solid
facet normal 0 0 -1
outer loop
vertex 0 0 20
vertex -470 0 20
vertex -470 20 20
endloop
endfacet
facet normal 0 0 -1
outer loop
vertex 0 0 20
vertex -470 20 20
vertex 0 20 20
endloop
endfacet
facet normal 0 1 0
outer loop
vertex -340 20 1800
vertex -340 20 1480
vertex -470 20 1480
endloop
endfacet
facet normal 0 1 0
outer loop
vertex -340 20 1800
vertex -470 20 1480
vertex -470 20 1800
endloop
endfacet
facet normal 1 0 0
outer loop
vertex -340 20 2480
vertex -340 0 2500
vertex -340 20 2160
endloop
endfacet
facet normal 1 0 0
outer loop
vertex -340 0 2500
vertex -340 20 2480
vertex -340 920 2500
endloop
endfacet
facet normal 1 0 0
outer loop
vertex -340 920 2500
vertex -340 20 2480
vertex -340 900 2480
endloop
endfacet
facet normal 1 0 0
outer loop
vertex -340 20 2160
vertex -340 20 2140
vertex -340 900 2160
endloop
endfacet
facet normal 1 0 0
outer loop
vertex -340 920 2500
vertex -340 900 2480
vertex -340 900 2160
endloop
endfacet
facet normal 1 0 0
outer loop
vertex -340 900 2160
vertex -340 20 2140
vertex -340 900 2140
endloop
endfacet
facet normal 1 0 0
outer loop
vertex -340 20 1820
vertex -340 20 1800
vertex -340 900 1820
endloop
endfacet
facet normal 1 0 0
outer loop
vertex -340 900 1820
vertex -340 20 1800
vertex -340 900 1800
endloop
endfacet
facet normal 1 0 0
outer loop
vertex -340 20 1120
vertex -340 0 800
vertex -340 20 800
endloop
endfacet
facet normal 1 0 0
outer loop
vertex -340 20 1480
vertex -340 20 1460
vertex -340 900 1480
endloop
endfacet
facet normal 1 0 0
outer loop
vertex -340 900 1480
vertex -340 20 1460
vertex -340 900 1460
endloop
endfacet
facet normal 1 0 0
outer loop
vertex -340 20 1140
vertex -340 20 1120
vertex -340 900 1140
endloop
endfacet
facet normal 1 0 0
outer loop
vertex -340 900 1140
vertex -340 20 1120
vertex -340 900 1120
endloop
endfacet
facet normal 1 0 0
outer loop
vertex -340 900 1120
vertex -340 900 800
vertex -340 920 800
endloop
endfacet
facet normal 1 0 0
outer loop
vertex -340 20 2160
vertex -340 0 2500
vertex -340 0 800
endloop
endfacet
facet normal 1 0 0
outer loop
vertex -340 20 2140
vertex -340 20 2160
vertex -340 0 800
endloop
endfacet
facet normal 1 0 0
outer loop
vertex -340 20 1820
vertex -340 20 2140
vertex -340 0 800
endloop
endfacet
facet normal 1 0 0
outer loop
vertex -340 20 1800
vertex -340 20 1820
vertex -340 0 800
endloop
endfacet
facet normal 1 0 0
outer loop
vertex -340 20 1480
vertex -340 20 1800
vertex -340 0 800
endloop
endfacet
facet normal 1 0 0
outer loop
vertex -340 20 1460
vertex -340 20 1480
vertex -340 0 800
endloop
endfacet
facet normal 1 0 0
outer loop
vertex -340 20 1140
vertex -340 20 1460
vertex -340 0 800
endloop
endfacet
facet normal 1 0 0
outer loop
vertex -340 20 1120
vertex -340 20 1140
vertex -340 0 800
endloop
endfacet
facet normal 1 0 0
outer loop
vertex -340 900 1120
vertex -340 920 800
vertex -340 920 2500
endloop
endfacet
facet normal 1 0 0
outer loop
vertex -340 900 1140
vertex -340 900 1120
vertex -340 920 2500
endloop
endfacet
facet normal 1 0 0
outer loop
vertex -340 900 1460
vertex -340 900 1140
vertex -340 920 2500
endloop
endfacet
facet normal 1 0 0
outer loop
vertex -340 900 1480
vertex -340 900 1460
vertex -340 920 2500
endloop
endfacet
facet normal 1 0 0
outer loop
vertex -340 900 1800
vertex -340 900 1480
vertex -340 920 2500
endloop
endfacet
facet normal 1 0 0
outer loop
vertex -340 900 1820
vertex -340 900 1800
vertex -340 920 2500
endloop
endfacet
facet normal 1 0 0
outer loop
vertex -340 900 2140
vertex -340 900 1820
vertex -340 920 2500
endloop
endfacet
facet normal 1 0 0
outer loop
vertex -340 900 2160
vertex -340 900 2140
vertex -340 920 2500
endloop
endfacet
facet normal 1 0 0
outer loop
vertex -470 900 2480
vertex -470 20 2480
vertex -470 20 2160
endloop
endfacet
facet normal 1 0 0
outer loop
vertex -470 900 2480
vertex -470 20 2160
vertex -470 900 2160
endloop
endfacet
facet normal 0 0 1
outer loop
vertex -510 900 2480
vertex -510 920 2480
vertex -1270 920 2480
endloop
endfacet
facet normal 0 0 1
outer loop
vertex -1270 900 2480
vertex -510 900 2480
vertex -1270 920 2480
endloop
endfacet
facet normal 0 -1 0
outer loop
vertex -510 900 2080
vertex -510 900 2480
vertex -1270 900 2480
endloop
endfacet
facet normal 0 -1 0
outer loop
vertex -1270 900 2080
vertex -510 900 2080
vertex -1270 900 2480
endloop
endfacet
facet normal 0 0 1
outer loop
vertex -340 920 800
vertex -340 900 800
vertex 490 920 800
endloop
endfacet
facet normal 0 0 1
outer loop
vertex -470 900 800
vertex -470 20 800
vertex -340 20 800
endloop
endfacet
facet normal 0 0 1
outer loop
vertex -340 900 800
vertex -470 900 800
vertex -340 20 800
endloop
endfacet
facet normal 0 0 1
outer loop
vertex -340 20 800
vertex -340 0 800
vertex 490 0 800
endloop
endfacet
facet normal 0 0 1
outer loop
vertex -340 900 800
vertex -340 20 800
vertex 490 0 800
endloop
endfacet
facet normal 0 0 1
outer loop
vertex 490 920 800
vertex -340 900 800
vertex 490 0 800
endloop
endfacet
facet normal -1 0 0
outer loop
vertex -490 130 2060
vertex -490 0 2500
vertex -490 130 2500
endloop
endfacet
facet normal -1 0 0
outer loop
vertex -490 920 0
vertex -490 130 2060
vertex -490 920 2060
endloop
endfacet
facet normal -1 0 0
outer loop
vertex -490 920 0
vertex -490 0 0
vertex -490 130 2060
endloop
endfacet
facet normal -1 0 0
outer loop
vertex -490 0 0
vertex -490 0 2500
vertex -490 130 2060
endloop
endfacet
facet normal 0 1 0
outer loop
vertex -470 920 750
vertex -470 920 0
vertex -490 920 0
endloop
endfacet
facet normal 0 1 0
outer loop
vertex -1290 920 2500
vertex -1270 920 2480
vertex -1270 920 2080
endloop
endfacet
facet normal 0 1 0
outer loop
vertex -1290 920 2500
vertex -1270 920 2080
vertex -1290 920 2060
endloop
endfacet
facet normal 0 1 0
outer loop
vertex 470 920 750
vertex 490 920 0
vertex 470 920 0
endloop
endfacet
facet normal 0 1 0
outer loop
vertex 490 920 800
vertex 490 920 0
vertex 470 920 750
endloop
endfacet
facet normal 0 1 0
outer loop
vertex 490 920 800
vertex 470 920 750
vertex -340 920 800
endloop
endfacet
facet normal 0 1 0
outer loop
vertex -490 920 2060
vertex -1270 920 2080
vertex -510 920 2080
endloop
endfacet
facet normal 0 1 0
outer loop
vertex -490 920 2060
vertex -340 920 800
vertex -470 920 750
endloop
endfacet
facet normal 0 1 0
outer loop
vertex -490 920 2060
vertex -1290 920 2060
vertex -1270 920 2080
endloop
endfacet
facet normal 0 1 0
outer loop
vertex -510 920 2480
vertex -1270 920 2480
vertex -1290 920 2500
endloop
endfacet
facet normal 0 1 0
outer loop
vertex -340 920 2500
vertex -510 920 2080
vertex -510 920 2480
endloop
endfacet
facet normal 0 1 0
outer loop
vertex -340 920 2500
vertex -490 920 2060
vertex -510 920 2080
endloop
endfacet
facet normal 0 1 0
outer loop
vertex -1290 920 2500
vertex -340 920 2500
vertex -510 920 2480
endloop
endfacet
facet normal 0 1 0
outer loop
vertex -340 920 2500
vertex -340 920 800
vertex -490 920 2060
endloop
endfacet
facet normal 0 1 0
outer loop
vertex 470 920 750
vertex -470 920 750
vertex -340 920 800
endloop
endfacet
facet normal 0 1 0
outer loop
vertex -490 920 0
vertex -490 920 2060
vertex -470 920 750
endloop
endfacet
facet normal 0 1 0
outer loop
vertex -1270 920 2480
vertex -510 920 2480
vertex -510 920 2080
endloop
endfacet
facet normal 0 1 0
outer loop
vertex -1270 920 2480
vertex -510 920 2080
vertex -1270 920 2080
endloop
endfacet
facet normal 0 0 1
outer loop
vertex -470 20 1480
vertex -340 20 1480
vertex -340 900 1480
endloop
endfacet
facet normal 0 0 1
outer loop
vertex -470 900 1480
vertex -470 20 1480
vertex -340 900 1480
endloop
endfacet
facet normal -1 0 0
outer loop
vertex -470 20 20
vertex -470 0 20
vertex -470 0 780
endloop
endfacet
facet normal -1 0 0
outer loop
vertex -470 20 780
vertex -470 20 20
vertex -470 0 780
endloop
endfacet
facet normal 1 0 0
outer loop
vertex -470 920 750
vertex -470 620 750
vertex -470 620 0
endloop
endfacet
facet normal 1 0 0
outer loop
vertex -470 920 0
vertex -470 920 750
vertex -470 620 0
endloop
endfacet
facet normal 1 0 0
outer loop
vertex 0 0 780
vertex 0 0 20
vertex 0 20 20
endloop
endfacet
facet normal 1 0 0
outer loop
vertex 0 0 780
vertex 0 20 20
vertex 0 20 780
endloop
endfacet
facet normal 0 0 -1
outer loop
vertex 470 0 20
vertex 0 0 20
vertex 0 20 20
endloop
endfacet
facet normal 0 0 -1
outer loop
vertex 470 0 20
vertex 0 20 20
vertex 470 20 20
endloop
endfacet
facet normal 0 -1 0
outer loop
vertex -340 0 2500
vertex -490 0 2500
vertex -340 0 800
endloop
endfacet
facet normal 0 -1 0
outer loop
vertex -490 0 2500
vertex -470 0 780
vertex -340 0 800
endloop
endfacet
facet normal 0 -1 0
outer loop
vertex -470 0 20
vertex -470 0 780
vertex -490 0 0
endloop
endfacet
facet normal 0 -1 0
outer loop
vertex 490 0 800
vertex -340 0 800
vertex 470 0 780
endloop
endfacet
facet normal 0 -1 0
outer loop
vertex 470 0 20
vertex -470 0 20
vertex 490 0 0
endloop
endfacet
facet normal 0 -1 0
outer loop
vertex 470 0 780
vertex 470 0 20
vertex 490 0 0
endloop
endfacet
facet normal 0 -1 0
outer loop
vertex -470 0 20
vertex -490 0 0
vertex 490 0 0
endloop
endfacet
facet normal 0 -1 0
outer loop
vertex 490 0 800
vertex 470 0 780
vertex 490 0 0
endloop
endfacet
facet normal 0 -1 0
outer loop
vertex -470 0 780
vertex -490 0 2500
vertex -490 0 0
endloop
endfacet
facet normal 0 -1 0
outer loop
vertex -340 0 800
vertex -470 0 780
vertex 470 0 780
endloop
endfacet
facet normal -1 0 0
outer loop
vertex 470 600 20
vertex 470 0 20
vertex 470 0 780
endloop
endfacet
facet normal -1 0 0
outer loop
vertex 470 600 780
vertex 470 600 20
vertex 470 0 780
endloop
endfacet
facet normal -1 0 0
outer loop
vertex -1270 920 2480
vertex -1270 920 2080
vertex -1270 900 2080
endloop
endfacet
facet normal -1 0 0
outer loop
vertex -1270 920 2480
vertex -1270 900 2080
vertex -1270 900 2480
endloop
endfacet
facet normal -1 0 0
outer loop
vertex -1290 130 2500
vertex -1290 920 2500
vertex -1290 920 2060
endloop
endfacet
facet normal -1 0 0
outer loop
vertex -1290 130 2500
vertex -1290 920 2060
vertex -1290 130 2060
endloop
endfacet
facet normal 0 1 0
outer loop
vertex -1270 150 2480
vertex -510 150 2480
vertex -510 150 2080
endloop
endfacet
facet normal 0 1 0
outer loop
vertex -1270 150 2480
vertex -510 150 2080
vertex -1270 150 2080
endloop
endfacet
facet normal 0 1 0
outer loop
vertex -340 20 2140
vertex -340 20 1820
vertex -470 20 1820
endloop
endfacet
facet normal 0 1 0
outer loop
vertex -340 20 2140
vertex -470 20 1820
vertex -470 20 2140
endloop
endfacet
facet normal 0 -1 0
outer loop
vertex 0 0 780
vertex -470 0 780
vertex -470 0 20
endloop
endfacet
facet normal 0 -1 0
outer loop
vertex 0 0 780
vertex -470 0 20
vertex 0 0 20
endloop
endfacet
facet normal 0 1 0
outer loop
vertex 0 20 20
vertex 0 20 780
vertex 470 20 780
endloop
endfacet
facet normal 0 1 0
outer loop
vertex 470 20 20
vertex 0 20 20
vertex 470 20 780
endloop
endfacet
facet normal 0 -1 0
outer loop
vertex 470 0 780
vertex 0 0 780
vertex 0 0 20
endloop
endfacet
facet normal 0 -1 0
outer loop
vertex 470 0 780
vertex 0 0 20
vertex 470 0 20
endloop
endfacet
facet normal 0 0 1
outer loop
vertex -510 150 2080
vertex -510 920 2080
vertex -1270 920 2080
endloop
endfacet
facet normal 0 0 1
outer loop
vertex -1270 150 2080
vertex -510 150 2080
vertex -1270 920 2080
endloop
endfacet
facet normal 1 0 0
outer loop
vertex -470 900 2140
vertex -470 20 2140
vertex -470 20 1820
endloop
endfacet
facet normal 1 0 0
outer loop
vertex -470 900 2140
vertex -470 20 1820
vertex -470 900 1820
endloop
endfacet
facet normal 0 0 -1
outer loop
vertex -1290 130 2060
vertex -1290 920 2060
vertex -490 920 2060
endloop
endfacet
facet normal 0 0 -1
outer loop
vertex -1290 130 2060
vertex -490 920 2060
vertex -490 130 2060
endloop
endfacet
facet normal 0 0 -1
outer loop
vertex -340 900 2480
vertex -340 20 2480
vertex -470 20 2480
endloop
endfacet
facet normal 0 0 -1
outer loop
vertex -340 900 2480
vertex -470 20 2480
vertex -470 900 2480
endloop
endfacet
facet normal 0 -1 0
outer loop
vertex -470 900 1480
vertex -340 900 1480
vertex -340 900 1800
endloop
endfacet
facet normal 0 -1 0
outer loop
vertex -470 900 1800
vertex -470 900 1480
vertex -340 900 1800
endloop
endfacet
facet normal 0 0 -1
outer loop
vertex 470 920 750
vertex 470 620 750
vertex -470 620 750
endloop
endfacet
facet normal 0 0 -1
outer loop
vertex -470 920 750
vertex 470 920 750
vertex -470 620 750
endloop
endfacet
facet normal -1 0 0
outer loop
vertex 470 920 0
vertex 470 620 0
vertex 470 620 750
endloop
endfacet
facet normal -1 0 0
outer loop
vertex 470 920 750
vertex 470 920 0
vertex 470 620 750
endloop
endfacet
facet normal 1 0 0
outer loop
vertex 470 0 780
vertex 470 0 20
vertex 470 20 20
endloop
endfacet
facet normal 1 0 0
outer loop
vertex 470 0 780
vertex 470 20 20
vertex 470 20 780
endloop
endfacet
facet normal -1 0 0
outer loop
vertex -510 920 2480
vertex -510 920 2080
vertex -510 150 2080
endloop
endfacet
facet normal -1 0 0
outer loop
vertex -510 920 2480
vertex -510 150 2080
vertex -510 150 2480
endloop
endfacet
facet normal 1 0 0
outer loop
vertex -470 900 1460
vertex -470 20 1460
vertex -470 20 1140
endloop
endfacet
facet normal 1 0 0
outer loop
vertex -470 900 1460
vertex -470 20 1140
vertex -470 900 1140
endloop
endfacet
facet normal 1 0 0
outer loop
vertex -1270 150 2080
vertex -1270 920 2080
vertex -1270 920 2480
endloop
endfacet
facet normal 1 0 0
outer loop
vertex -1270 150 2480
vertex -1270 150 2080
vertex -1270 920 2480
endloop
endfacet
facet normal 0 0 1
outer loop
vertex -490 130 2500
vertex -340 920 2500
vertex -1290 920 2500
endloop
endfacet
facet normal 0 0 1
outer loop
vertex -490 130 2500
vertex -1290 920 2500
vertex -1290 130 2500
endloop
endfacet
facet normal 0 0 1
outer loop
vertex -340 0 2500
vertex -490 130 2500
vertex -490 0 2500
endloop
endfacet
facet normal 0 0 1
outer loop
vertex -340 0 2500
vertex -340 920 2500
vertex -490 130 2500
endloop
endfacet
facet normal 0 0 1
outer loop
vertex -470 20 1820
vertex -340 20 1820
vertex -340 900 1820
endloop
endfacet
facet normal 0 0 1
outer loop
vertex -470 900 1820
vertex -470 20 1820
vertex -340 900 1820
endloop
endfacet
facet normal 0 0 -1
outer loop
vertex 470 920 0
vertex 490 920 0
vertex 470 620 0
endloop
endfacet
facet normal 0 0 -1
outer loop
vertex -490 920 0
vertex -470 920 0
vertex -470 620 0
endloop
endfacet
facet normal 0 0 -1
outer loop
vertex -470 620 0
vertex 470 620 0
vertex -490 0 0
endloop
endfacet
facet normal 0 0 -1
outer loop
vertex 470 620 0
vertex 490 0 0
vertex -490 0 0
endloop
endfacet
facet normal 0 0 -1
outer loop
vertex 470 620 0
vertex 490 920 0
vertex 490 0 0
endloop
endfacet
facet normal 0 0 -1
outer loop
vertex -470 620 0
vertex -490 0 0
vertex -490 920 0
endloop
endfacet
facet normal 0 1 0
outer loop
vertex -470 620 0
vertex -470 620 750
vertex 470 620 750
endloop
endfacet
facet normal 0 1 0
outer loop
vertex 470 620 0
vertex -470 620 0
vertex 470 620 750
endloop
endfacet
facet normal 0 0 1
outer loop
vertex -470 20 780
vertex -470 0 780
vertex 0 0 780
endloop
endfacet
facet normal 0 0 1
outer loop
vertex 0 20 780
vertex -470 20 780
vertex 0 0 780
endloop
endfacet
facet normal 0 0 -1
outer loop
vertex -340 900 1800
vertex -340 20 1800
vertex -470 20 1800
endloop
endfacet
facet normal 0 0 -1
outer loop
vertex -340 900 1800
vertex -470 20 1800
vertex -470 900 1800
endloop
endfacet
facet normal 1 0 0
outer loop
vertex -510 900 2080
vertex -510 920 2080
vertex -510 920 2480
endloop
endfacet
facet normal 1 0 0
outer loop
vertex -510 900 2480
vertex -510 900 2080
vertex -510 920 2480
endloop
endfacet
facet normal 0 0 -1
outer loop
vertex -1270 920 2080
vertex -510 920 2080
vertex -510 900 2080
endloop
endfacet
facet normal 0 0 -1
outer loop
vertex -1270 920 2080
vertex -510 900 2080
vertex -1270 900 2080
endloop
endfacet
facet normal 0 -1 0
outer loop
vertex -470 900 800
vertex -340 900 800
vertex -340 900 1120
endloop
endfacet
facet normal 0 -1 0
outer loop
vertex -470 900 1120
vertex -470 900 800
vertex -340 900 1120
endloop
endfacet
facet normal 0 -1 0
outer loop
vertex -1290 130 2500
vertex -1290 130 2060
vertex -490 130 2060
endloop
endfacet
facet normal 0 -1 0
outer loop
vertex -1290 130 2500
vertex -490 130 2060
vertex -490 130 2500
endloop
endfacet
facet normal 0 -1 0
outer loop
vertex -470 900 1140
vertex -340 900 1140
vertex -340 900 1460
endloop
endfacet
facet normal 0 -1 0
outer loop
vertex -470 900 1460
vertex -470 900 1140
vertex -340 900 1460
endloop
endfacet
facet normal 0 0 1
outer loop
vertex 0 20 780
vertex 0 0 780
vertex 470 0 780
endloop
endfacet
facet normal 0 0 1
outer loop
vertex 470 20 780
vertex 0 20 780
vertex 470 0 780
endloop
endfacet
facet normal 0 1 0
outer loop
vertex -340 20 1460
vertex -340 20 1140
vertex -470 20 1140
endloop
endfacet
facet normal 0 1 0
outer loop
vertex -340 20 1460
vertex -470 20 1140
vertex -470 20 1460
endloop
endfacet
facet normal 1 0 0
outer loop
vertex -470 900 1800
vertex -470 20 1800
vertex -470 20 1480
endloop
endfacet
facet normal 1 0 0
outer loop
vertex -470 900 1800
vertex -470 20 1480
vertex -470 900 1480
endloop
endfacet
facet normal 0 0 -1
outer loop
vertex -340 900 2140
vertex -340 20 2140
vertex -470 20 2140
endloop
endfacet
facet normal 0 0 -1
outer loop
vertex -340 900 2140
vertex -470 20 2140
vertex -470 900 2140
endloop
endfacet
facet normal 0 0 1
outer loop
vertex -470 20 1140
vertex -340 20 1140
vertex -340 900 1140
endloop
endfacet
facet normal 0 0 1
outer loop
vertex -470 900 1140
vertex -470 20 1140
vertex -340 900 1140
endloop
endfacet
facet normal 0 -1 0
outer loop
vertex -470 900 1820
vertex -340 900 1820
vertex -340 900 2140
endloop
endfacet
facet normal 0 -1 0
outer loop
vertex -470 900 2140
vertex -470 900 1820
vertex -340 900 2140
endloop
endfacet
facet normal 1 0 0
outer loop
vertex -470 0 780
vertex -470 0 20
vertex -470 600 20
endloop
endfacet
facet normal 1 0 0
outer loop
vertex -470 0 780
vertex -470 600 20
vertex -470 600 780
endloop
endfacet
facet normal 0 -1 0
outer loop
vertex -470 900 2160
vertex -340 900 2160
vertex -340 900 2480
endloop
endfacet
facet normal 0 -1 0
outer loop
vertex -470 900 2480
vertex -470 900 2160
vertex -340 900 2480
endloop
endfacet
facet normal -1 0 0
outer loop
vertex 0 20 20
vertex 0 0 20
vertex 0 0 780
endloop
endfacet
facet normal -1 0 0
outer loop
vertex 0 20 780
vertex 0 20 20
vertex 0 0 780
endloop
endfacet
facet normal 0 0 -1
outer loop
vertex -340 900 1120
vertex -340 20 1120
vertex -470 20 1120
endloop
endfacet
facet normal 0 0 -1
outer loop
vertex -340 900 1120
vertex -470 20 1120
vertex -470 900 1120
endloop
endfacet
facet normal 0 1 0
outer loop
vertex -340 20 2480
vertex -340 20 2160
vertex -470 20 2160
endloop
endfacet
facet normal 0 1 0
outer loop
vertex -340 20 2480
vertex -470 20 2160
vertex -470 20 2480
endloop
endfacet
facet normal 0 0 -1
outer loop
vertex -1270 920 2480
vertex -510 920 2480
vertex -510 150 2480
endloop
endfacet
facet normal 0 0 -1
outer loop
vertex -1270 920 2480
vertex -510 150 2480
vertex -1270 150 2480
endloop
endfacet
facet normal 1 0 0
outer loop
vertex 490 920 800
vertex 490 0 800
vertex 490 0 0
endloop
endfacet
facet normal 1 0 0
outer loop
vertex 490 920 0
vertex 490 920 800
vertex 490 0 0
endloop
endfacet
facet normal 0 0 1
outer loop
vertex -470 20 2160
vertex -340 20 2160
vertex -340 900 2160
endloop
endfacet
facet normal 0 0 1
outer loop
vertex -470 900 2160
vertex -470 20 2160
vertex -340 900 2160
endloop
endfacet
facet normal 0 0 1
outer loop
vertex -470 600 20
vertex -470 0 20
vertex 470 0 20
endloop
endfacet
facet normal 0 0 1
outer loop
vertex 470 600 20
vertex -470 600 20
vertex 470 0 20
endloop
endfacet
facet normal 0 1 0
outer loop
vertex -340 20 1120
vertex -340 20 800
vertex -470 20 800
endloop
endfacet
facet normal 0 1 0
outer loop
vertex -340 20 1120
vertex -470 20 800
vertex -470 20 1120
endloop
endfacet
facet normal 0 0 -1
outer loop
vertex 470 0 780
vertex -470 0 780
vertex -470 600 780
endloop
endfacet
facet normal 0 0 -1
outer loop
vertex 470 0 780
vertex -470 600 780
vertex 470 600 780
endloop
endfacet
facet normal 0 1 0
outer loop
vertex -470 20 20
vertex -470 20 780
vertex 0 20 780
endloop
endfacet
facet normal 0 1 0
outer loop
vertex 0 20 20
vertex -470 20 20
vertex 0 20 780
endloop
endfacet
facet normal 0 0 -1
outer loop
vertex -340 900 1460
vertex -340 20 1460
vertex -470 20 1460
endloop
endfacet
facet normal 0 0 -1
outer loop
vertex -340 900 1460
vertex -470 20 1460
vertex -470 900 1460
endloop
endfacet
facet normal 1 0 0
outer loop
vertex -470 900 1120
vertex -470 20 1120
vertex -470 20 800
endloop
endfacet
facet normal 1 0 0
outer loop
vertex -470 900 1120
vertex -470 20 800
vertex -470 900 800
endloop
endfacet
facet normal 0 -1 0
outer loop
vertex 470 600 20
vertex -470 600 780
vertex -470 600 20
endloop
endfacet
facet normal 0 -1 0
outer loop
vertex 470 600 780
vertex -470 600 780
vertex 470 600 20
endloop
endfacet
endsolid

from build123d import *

# Parameters (mm, degrees)
F0_W      = 980
F0_H      = 800
F0_W_2    = 470
F0_H_2    = 760
F1_DEPTH  = 620
F2_T      = -20
F3_DEPTH  = 20
F4_DEPTH  = 20
F6_DEPTH  = 300
F7_W      = 150
F7_H      = 920
F8_DEPTH  = 1700
F9_W      = 880
F9_H      = 320
F10_DEPTH = 130
F11_W     = 790
F11_H     = 440
F12_DEPTH = 800
F13_W     = 760
F13_H     = 400
F14_DEPTH = 770
F15_DEPTH = 20


with BuildPart() as f1:
    # F0 (on Front) → F1 (new body)
    with BuildSketch(Plane.XZ):
        with Locations((0, 400)):
            Rectangle(F0_W, F0_H)
        Polygon((-470, 20), (-470, 780), (0, 780), (470, 780), (470, 20), (0, 20), align=None, mode=Mode.SUBTRACT)
        with Locations((-235, 400)):
            Rectangle(F0_W_2, F0_H_2)
        with Locations((235, 400)):
            Rectangle(F0_W_2, F0_H_2)
    extrude(amount=-F1_DEPTH)

    # F2
    f2_openings = [f1.faces().sort_by_distance(p)[0] for p in [
        (0, 0, 400),
    ]]
    offset(amount=F2_T, openings=f2_openings)

    # F5 (on face) → F6 (join)
    with BuildSketch(Plane(origin=(0, 620, 0), x_dir=(-1, 0, 0), z_dir=(0, 1, 0))):
        Polygon((-490, 0), (-470, 0), (-470, 750), (470, 750), (470, 0), (490, 0), (490, 800), (-490, 800), align=None)
    extrude(amount=F6_DEPTH)

    # F7 (on face) → F8 (join)
    with BuildSketch(Plane.XY.offset(800)):
        with Locations((-415, 460)):
            Rectangle(F7_W, F7_H)
    extrude(amount=F8_DEPTH)

    # F9 (on face) → F10 (cut, through all)
    with BuildSketch(Plane.YZ.offset(-340)):
        with Locations((460, 960)):
            Rectangle(F9_W, F9_H)
        with Locations((460, 1300)):
            Rectangle(F9_W, F9_H)
        with Locations((460, 1640)):
            Rectangle(F9_W, F9_H)
        with Locations((460, 1980)):
            Rectangle(F9_W, F9_H)
        with Locations((460, 2320)):
            Rectangle(F9_W, F9_H)
    extrude(amount=-F10_DEPTH, mode=Mode.SUBTRACT)

    # F11 (on face) → F12 (join)
    with BuildSketch(Plane(origin=(-490, 0, 0), x_dir=(0, -1, 0), z_dir=(-1, 0, 0))):
        with Locations((-525, 2280)):
            Rectangle(F11_W, F11_H)
    extrude(amount=F12_DEPTH)

    # F13 (on face) → F14 (cut, through all)
    with BuildSketch(Plane(origin=(0, 920, 0), x_dir=(-1, 0, 0), z_dir=(0, 1, 0))):
        with Locations((890, 2280)):
            Rectangle(F13_W, F13_H)
    extrude(amount=-F14_DEPTH, mode=Mode.SUBTRACT)


with BuildPart() as f3:
    # F0 (on Front) → F3 (new body)
    with BuildSketch(Plane.XZ):
        with Locations((-235, 400)):
            Rectangle(F0_W_2, F0_H_2)
    extrude(amount=-F3_DEPTH)


with BuildPart() as f4:
    # F0 (on Front) → F4 (new body)
    with BuildSketch(Plane.XZ):
        with Locations((235, 400)):
            Rectangle(F0_W_2, F0_H_2)
    extrude(amount=-F4_DEPTH)


with BuildPart() as f15:
    # F13 (on face) → F15 (new body)
    with BuildSketch(Plane(origin=(0, 920, 0), x_dir=(-1, 0, 0), z_dir=(0, 1, 0))):
        with Locations((890, 2280)):
            Rectangle(F13_W, F13_H)
    extrude(amount=-F15_DEPTH)


solid = Compound([f1.part, f3.part, f4.part, f15.part])
